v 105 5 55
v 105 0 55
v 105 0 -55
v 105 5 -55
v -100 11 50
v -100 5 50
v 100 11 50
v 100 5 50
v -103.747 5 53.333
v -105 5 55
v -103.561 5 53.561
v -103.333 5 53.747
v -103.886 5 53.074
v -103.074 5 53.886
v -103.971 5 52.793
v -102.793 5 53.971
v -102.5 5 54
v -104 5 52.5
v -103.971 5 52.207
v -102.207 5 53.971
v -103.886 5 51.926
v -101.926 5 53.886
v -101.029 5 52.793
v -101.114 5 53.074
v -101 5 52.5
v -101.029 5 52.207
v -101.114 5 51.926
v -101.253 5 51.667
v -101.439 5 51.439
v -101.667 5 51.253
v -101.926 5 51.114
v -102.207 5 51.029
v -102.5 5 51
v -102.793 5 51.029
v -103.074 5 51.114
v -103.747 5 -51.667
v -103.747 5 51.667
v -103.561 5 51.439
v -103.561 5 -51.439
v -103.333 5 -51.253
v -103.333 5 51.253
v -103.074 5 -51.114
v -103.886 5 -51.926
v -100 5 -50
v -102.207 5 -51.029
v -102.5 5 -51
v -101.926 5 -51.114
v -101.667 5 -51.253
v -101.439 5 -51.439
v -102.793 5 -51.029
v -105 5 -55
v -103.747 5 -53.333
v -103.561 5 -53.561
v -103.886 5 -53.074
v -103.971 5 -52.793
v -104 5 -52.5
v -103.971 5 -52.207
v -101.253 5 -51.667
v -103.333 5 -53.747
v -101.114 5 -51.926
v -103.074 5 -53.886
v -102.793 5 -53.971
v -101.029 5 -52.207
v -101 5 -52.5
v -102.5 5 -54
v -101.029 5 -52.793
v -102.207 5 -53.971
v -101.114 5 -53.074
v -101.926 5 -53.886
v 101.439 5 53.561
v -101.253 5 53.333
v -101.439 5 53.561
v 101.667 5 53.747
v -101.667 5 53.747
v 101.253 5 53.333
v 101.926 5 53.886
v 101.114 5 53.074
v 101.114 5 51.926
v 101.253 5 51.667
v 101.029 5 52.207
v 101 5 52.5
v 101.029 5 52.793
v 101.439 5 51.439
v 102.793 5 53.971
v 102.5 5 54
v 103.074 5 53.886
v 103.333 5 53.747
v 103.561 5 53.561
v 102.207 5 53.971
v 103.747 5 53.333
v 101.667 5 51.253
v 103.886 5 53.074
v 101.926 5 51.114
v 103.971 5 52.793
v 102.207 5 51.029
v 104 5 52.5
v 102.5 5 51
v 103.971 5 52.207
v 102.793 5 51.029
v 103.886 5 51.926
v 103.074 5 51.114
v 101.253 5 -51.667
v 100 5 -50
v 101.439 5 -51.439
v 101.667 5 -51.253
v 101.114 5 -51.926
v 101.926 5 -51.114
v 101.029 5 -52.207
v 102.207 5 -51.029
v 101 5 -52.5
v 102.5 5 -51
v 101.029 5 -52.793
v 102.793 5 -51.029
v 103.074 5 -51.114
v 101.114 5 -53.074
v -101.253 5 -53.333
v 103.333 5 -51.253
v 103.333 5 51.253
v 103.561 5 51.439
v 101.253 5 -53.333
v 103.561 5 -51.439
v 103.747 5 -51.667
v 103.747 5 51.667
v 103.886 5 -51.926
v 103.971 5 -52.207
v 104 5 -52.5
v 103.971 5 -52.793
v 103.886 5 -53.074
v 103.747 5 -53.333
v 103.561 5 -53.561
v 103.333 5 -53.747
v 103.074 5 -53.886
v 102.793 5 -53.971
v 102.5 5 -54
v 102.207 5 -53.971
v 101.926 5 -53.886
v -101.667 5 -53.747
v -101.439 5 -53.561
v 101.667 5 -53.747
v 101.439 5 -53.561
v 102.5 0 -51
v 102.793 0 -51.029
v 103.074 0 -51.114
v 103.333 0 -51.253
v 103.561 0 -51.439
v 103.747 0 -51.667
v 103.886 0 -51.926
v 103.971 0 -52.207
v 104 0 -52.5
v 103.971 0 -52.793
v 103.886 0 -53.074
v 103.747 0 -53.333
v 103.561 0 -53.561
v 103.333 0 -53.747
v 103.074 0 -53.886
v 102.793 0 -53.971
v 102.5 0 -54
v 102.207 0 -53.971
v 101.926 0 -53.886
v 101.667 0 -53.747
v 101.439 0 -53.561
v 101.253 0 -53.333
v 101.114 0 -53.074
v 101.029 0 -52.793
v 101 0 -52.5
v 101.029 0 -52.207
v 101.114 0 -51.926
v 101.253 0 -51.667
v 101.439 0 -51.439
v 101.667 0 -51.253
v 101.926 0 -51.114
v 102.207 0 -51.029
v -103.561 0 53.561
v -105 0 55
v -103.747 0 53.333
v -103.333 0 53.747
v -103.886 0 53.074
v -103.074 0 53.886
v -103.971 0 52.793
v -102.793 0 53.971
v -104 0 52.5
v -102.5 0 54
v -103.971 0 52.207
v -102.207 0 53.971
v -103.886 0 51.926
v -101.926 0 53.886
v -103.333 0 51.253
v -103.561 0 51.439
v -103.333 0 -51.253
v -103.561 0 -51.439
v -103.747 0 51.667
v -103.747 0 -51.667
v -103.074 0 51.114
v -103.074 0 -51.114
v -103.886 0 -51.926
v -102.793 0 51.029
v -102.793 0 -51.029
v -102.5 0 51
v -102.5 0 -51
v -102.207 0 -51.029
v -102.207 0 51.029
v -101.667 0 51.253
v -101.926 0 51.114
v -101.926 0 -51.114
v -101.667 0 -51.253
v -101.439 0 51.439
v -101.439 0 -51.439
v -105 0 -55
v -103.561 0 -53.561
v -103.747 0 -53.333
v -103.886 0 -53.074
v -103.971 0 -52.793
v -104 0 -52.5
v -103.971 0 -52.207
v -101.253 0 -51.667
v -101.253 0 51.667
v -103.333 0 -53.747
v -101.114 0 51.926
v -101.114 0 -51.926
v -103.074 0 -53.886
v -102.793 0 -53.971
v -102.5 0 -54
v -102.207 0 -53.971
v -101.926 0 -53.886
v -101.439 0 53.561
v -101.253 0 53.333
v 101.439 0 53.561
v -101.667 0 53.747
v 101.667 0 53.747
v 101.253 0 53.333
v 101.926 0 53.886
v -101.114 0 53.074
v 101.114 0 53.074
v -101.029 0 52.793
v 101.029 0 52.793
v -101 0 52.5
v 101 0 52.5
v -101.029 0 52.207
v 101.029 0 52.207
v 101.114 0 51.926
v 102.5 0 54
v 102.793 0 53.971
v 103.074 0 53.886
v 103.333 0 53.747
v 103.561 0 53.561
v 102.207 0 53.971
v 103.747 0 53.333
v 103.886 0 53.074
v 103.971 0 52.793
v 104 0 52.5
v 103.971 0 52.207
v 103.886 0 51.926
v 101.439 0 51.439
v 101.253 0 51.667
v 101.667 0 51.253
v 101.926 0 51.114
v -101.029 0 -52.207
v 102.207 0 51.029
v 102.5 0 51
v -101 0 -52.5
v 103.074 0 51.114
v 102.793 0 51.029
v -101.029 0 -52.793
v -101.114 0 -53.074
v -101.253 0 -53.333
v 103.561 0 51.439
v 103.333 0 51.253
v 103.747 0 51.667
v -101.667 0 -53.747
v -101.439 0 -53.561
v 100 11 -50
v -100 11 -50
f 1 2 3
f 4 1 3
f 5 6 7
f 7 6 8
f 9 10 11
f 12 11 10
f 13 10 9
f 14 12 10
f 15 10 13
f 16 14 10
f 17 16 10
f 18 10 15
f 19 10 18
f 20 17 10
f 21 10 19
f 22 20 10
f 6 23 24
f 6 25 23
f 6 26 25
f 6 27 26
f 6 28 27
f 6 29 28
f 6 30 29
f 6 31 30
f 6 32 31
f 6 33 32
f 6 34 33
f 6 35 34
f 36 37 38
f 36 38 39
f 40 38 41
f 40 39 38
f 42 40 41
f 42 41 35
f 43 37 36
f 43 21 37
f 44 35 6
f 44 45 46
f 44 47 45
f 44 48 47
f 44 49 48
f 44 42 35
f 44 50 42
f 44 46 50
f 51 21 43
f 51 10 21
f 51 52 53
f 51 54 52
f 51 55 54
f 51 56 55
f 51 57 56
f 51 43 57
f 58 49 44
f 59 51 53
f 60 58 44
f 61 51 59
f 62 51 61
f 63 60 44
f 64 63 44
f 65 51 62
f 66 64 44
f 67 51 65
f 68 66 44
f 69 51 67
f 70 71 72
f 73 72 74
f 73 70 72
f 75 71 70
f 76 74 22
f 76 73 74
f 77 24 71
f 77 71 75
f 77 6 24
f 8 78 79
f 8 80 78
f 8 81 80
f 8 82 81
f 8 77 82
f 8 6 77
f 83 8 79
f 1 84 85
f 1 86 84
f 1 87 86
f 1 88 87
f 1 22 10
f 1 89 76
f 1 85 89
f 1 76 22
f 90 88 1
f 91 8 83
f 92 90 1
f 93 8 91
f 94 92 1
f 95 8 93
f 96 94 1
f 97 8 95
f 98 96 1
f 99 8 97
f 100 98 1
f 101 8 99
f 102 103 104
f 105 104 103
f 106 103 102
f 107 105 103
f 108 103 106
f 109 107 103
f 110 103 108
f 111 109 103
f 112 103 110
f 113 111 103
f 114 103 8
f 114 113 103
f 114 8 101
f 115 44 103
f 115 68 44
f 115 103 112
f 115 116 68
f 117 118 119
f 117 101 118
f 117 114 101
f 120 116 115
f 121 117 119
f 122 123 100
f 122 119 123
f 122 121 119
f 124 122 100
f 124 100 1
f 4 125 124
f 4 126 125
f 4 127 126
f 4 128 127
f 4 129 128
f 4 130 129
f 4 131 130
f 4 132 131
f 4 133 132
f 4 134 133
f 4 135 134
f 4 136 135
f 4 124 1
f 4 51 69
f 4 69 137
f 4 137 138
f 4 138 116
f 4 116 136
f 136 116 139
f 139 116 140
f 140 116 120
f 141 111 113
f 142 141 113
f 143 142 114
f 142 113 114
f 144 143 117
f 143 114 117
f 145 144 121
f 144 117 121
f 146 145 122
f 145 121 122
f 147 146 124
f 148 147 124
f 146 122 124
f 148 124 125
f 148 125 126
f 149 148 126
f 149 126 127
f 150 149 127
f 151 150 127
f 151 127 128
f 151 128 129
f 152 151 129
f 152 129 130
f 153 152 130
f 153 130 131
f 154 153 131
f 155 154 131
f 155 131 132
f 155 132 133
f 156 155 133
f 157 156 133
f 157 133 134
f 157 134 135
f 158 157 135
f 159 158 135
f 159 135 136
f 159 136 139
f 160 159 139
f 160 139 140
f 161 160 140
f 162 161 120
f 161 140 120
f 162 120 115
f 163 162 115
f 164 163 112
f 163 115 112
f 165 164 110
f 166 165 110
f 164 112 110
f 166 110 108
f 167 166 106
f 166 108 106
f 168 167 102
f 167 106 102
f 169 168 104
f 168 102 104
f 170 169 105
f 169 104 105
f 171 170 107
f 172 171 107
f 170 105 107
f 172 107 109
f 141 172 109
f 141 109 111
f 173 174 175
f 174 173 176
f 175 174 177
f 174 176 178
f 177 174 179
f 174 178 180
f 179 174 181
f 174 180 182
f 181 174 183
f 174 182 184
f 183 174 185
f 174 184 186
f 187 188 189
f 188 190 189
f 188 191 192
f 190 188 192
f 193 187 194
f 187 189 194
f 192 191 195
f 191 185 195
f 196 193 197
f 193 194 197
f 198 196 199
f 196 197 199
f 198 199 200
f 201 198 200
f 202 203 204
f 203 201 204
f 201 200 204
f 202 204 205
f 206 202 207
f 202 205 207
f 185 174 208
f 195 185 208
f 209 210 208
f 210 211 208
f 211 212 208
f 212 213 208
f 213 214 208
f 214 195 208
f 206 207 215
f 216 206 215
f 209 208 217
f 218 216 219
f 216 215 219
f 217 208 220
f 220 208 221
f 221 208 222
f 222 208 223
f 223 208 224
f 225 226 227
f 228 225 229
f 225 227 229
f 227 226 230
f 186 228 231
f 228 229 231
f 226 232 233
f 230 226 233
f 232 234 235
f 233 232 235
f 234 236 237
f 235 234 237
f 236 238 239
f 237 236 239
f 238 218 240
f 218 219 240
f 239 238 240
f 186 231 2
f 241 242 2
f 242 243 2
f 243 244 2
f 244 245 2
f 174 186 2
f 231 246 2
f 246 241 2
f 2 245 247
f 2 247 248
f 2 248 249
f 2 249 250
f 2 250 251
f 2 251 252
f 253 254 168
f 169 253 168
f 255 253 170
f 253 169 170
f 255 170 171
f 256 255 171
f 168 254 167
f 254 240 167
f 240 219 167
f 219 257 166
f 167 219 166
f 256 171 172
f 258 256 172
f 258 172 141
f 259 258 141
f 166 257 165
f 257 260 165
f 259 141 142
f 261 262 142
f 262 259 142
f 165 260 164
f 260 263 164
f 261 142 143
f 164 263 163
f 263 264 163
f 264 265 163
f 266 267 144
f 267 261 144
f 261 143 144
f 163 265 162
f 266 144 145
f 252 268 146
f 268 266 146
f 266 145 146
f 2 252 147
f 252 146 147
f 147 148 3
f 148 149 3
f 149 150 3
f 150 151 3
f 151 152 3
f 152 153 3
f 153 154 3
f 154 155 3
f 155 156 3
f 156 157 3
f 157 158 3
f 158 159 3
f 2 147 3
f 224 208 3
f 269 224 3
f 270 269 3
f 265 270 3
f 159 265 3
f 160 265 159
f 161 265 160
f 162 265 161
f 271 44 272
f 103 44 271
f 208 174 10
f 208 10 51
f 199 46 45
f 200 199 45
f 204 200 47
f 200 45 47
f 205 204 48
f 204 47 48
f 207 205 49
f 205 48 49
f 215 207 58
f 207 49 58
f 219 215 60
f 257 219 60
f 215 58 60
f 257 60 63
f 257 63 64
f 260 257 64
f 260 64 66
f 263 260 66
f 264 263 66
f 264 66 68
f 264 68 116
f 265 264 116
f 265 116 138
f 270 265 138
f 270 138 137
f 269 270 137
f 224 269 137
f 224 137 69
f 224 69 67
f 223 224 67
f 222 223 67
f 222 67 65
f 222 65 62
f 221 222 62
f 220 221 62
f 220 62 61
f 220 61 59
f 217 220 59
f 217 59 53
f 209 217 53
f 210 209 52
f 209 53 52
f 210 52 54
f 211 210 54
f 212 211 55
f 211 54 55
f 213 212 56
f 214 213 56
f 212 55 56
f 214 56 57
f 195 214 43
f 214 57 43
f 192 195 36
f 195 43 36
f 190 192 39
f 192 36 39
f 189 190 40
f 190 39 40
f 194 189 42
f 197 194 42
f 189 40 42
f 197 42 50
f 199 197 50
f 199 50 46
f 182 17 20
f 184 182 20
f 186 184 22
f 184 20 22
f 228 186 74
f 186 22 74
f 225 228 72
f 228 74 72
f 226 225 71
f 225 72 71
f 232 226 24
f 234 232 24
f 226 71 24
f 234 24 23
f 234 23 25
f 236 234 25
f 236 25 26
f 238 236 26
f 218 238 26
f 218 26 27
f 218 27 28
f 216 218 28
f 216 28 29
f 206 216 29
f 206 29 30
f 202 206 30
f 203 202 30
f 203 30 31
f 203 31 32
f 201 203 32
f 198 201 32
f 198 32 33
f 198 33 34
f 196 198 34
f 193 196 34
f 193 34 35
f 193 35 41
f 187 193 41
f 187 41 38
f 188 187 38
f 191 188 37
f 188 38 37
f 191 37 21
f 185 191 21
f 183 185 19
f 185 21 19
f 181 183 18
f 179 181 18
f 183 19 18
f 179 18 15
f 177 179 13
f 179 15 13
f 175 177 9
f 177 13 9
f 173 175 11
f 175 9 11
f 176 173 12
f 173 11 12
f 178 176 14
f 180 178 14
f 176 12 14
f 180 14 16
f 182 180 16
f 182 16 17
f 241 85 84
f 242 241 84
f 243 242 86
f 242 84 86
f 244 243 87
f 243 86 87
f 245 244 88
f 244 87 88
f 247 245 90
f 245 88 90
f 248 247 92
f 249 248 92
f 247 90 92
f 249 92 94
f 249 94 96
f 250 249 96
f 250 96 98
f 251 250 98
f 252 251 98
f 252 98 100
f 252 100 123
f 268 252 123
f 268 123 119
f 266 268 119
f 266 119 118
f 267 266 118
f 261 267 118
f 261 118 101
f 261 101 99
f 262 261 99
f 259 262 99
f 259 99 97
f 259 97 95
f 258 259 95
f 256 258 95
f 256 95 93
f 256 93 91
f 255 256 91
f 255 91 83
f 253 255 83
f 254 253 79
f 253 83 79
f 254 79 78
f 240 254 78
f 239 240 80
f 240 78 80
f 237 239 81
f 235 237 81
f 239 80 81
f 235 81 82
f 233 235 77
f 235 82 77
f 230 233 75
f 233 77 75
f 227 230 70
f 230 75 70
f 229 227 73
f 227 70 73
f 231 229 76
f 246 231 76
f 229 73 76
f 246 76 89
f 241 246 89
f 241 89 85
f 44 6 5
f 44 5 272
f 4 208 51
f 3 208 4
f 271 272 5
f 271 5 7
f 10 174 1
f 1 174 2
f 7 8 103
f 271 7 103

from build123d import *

# Parameters (mm, degrees)
SKETCH1_W               = 210
SKETCH1_H               = 110
TOP_DEPTH               = 5
SKETCH2_W               = 200
SKETCH2_H               = 100
BOTTOM_DEPTH            = 6
HOLE_REACH              = 120.684
SKETCH4_R               = 1.5
HOLE_PATTERN_COUNT      = 2
HOLE_PATTERN_PITCH      = 105
HOLE_PATTERN_COUNT_DIR2 = 2
HOLE_PATTERN_PITCH_DIR2 = 205


with BuildPart() as part:
    # Sketch1 → Top (new body)
    with BuildSketch(Plane(origin=(0, 0, 0), x_dir=(1, 0, 0), z_dir=(0, 1, 0))):
        Rectangle(SKETCH1_W, SKETCH1_H)
    extrude(amount=TOP_DEPTH)

    # Sketch2 → Bottom (add)
    with BuildSketch(Plane(origin=(0, 5, 0), x_dir=(1, 0, 0), z_dir=(0, 1, 0))):
        Rectangle(SKETCH2_W, SKETCH2_H)
    extrude(amount=BOTTOM_DEPTH)

    # Sketch4 → Hole (cut, up to next)
    with BuildSketch(Plane(origin=(0, 5, 0), x_dir=(1, 0, 0), z_dir=(0, 1, 0)), mode=Mode.PRIVATE) as hole_sk1:
        with Locations(Location((-102.5, -52.5, 0), (0, 0, 270))):
            Circle(SKETCH4_R)
    hole_tool1 = extrude(hole_sk1.sketch, amount=-HOLE_REACH, mode=Mode.PRIVATE) & part.part
    hole = hole_tool1.solids().sort_by_distance((-102.5, 5, 52.5))[0]
    add(hole, mode=Mode.SUBTRACT)

    # Hole-Pattern: Hole 2 × 2
    with Locations(*[(j * HOLE_PATTERN_PITCH_DIR2, 0, -i * HOLE_PATTERN_PITCH) for i in range(HOLE_PATTERN_COUNT) for j in range(HOLE_PATTERN_COUNT_DIR2) if (i, j) != (0, 0)]):
        add(hole, mode=Mode.SUBTRACT)


solid = part.part
